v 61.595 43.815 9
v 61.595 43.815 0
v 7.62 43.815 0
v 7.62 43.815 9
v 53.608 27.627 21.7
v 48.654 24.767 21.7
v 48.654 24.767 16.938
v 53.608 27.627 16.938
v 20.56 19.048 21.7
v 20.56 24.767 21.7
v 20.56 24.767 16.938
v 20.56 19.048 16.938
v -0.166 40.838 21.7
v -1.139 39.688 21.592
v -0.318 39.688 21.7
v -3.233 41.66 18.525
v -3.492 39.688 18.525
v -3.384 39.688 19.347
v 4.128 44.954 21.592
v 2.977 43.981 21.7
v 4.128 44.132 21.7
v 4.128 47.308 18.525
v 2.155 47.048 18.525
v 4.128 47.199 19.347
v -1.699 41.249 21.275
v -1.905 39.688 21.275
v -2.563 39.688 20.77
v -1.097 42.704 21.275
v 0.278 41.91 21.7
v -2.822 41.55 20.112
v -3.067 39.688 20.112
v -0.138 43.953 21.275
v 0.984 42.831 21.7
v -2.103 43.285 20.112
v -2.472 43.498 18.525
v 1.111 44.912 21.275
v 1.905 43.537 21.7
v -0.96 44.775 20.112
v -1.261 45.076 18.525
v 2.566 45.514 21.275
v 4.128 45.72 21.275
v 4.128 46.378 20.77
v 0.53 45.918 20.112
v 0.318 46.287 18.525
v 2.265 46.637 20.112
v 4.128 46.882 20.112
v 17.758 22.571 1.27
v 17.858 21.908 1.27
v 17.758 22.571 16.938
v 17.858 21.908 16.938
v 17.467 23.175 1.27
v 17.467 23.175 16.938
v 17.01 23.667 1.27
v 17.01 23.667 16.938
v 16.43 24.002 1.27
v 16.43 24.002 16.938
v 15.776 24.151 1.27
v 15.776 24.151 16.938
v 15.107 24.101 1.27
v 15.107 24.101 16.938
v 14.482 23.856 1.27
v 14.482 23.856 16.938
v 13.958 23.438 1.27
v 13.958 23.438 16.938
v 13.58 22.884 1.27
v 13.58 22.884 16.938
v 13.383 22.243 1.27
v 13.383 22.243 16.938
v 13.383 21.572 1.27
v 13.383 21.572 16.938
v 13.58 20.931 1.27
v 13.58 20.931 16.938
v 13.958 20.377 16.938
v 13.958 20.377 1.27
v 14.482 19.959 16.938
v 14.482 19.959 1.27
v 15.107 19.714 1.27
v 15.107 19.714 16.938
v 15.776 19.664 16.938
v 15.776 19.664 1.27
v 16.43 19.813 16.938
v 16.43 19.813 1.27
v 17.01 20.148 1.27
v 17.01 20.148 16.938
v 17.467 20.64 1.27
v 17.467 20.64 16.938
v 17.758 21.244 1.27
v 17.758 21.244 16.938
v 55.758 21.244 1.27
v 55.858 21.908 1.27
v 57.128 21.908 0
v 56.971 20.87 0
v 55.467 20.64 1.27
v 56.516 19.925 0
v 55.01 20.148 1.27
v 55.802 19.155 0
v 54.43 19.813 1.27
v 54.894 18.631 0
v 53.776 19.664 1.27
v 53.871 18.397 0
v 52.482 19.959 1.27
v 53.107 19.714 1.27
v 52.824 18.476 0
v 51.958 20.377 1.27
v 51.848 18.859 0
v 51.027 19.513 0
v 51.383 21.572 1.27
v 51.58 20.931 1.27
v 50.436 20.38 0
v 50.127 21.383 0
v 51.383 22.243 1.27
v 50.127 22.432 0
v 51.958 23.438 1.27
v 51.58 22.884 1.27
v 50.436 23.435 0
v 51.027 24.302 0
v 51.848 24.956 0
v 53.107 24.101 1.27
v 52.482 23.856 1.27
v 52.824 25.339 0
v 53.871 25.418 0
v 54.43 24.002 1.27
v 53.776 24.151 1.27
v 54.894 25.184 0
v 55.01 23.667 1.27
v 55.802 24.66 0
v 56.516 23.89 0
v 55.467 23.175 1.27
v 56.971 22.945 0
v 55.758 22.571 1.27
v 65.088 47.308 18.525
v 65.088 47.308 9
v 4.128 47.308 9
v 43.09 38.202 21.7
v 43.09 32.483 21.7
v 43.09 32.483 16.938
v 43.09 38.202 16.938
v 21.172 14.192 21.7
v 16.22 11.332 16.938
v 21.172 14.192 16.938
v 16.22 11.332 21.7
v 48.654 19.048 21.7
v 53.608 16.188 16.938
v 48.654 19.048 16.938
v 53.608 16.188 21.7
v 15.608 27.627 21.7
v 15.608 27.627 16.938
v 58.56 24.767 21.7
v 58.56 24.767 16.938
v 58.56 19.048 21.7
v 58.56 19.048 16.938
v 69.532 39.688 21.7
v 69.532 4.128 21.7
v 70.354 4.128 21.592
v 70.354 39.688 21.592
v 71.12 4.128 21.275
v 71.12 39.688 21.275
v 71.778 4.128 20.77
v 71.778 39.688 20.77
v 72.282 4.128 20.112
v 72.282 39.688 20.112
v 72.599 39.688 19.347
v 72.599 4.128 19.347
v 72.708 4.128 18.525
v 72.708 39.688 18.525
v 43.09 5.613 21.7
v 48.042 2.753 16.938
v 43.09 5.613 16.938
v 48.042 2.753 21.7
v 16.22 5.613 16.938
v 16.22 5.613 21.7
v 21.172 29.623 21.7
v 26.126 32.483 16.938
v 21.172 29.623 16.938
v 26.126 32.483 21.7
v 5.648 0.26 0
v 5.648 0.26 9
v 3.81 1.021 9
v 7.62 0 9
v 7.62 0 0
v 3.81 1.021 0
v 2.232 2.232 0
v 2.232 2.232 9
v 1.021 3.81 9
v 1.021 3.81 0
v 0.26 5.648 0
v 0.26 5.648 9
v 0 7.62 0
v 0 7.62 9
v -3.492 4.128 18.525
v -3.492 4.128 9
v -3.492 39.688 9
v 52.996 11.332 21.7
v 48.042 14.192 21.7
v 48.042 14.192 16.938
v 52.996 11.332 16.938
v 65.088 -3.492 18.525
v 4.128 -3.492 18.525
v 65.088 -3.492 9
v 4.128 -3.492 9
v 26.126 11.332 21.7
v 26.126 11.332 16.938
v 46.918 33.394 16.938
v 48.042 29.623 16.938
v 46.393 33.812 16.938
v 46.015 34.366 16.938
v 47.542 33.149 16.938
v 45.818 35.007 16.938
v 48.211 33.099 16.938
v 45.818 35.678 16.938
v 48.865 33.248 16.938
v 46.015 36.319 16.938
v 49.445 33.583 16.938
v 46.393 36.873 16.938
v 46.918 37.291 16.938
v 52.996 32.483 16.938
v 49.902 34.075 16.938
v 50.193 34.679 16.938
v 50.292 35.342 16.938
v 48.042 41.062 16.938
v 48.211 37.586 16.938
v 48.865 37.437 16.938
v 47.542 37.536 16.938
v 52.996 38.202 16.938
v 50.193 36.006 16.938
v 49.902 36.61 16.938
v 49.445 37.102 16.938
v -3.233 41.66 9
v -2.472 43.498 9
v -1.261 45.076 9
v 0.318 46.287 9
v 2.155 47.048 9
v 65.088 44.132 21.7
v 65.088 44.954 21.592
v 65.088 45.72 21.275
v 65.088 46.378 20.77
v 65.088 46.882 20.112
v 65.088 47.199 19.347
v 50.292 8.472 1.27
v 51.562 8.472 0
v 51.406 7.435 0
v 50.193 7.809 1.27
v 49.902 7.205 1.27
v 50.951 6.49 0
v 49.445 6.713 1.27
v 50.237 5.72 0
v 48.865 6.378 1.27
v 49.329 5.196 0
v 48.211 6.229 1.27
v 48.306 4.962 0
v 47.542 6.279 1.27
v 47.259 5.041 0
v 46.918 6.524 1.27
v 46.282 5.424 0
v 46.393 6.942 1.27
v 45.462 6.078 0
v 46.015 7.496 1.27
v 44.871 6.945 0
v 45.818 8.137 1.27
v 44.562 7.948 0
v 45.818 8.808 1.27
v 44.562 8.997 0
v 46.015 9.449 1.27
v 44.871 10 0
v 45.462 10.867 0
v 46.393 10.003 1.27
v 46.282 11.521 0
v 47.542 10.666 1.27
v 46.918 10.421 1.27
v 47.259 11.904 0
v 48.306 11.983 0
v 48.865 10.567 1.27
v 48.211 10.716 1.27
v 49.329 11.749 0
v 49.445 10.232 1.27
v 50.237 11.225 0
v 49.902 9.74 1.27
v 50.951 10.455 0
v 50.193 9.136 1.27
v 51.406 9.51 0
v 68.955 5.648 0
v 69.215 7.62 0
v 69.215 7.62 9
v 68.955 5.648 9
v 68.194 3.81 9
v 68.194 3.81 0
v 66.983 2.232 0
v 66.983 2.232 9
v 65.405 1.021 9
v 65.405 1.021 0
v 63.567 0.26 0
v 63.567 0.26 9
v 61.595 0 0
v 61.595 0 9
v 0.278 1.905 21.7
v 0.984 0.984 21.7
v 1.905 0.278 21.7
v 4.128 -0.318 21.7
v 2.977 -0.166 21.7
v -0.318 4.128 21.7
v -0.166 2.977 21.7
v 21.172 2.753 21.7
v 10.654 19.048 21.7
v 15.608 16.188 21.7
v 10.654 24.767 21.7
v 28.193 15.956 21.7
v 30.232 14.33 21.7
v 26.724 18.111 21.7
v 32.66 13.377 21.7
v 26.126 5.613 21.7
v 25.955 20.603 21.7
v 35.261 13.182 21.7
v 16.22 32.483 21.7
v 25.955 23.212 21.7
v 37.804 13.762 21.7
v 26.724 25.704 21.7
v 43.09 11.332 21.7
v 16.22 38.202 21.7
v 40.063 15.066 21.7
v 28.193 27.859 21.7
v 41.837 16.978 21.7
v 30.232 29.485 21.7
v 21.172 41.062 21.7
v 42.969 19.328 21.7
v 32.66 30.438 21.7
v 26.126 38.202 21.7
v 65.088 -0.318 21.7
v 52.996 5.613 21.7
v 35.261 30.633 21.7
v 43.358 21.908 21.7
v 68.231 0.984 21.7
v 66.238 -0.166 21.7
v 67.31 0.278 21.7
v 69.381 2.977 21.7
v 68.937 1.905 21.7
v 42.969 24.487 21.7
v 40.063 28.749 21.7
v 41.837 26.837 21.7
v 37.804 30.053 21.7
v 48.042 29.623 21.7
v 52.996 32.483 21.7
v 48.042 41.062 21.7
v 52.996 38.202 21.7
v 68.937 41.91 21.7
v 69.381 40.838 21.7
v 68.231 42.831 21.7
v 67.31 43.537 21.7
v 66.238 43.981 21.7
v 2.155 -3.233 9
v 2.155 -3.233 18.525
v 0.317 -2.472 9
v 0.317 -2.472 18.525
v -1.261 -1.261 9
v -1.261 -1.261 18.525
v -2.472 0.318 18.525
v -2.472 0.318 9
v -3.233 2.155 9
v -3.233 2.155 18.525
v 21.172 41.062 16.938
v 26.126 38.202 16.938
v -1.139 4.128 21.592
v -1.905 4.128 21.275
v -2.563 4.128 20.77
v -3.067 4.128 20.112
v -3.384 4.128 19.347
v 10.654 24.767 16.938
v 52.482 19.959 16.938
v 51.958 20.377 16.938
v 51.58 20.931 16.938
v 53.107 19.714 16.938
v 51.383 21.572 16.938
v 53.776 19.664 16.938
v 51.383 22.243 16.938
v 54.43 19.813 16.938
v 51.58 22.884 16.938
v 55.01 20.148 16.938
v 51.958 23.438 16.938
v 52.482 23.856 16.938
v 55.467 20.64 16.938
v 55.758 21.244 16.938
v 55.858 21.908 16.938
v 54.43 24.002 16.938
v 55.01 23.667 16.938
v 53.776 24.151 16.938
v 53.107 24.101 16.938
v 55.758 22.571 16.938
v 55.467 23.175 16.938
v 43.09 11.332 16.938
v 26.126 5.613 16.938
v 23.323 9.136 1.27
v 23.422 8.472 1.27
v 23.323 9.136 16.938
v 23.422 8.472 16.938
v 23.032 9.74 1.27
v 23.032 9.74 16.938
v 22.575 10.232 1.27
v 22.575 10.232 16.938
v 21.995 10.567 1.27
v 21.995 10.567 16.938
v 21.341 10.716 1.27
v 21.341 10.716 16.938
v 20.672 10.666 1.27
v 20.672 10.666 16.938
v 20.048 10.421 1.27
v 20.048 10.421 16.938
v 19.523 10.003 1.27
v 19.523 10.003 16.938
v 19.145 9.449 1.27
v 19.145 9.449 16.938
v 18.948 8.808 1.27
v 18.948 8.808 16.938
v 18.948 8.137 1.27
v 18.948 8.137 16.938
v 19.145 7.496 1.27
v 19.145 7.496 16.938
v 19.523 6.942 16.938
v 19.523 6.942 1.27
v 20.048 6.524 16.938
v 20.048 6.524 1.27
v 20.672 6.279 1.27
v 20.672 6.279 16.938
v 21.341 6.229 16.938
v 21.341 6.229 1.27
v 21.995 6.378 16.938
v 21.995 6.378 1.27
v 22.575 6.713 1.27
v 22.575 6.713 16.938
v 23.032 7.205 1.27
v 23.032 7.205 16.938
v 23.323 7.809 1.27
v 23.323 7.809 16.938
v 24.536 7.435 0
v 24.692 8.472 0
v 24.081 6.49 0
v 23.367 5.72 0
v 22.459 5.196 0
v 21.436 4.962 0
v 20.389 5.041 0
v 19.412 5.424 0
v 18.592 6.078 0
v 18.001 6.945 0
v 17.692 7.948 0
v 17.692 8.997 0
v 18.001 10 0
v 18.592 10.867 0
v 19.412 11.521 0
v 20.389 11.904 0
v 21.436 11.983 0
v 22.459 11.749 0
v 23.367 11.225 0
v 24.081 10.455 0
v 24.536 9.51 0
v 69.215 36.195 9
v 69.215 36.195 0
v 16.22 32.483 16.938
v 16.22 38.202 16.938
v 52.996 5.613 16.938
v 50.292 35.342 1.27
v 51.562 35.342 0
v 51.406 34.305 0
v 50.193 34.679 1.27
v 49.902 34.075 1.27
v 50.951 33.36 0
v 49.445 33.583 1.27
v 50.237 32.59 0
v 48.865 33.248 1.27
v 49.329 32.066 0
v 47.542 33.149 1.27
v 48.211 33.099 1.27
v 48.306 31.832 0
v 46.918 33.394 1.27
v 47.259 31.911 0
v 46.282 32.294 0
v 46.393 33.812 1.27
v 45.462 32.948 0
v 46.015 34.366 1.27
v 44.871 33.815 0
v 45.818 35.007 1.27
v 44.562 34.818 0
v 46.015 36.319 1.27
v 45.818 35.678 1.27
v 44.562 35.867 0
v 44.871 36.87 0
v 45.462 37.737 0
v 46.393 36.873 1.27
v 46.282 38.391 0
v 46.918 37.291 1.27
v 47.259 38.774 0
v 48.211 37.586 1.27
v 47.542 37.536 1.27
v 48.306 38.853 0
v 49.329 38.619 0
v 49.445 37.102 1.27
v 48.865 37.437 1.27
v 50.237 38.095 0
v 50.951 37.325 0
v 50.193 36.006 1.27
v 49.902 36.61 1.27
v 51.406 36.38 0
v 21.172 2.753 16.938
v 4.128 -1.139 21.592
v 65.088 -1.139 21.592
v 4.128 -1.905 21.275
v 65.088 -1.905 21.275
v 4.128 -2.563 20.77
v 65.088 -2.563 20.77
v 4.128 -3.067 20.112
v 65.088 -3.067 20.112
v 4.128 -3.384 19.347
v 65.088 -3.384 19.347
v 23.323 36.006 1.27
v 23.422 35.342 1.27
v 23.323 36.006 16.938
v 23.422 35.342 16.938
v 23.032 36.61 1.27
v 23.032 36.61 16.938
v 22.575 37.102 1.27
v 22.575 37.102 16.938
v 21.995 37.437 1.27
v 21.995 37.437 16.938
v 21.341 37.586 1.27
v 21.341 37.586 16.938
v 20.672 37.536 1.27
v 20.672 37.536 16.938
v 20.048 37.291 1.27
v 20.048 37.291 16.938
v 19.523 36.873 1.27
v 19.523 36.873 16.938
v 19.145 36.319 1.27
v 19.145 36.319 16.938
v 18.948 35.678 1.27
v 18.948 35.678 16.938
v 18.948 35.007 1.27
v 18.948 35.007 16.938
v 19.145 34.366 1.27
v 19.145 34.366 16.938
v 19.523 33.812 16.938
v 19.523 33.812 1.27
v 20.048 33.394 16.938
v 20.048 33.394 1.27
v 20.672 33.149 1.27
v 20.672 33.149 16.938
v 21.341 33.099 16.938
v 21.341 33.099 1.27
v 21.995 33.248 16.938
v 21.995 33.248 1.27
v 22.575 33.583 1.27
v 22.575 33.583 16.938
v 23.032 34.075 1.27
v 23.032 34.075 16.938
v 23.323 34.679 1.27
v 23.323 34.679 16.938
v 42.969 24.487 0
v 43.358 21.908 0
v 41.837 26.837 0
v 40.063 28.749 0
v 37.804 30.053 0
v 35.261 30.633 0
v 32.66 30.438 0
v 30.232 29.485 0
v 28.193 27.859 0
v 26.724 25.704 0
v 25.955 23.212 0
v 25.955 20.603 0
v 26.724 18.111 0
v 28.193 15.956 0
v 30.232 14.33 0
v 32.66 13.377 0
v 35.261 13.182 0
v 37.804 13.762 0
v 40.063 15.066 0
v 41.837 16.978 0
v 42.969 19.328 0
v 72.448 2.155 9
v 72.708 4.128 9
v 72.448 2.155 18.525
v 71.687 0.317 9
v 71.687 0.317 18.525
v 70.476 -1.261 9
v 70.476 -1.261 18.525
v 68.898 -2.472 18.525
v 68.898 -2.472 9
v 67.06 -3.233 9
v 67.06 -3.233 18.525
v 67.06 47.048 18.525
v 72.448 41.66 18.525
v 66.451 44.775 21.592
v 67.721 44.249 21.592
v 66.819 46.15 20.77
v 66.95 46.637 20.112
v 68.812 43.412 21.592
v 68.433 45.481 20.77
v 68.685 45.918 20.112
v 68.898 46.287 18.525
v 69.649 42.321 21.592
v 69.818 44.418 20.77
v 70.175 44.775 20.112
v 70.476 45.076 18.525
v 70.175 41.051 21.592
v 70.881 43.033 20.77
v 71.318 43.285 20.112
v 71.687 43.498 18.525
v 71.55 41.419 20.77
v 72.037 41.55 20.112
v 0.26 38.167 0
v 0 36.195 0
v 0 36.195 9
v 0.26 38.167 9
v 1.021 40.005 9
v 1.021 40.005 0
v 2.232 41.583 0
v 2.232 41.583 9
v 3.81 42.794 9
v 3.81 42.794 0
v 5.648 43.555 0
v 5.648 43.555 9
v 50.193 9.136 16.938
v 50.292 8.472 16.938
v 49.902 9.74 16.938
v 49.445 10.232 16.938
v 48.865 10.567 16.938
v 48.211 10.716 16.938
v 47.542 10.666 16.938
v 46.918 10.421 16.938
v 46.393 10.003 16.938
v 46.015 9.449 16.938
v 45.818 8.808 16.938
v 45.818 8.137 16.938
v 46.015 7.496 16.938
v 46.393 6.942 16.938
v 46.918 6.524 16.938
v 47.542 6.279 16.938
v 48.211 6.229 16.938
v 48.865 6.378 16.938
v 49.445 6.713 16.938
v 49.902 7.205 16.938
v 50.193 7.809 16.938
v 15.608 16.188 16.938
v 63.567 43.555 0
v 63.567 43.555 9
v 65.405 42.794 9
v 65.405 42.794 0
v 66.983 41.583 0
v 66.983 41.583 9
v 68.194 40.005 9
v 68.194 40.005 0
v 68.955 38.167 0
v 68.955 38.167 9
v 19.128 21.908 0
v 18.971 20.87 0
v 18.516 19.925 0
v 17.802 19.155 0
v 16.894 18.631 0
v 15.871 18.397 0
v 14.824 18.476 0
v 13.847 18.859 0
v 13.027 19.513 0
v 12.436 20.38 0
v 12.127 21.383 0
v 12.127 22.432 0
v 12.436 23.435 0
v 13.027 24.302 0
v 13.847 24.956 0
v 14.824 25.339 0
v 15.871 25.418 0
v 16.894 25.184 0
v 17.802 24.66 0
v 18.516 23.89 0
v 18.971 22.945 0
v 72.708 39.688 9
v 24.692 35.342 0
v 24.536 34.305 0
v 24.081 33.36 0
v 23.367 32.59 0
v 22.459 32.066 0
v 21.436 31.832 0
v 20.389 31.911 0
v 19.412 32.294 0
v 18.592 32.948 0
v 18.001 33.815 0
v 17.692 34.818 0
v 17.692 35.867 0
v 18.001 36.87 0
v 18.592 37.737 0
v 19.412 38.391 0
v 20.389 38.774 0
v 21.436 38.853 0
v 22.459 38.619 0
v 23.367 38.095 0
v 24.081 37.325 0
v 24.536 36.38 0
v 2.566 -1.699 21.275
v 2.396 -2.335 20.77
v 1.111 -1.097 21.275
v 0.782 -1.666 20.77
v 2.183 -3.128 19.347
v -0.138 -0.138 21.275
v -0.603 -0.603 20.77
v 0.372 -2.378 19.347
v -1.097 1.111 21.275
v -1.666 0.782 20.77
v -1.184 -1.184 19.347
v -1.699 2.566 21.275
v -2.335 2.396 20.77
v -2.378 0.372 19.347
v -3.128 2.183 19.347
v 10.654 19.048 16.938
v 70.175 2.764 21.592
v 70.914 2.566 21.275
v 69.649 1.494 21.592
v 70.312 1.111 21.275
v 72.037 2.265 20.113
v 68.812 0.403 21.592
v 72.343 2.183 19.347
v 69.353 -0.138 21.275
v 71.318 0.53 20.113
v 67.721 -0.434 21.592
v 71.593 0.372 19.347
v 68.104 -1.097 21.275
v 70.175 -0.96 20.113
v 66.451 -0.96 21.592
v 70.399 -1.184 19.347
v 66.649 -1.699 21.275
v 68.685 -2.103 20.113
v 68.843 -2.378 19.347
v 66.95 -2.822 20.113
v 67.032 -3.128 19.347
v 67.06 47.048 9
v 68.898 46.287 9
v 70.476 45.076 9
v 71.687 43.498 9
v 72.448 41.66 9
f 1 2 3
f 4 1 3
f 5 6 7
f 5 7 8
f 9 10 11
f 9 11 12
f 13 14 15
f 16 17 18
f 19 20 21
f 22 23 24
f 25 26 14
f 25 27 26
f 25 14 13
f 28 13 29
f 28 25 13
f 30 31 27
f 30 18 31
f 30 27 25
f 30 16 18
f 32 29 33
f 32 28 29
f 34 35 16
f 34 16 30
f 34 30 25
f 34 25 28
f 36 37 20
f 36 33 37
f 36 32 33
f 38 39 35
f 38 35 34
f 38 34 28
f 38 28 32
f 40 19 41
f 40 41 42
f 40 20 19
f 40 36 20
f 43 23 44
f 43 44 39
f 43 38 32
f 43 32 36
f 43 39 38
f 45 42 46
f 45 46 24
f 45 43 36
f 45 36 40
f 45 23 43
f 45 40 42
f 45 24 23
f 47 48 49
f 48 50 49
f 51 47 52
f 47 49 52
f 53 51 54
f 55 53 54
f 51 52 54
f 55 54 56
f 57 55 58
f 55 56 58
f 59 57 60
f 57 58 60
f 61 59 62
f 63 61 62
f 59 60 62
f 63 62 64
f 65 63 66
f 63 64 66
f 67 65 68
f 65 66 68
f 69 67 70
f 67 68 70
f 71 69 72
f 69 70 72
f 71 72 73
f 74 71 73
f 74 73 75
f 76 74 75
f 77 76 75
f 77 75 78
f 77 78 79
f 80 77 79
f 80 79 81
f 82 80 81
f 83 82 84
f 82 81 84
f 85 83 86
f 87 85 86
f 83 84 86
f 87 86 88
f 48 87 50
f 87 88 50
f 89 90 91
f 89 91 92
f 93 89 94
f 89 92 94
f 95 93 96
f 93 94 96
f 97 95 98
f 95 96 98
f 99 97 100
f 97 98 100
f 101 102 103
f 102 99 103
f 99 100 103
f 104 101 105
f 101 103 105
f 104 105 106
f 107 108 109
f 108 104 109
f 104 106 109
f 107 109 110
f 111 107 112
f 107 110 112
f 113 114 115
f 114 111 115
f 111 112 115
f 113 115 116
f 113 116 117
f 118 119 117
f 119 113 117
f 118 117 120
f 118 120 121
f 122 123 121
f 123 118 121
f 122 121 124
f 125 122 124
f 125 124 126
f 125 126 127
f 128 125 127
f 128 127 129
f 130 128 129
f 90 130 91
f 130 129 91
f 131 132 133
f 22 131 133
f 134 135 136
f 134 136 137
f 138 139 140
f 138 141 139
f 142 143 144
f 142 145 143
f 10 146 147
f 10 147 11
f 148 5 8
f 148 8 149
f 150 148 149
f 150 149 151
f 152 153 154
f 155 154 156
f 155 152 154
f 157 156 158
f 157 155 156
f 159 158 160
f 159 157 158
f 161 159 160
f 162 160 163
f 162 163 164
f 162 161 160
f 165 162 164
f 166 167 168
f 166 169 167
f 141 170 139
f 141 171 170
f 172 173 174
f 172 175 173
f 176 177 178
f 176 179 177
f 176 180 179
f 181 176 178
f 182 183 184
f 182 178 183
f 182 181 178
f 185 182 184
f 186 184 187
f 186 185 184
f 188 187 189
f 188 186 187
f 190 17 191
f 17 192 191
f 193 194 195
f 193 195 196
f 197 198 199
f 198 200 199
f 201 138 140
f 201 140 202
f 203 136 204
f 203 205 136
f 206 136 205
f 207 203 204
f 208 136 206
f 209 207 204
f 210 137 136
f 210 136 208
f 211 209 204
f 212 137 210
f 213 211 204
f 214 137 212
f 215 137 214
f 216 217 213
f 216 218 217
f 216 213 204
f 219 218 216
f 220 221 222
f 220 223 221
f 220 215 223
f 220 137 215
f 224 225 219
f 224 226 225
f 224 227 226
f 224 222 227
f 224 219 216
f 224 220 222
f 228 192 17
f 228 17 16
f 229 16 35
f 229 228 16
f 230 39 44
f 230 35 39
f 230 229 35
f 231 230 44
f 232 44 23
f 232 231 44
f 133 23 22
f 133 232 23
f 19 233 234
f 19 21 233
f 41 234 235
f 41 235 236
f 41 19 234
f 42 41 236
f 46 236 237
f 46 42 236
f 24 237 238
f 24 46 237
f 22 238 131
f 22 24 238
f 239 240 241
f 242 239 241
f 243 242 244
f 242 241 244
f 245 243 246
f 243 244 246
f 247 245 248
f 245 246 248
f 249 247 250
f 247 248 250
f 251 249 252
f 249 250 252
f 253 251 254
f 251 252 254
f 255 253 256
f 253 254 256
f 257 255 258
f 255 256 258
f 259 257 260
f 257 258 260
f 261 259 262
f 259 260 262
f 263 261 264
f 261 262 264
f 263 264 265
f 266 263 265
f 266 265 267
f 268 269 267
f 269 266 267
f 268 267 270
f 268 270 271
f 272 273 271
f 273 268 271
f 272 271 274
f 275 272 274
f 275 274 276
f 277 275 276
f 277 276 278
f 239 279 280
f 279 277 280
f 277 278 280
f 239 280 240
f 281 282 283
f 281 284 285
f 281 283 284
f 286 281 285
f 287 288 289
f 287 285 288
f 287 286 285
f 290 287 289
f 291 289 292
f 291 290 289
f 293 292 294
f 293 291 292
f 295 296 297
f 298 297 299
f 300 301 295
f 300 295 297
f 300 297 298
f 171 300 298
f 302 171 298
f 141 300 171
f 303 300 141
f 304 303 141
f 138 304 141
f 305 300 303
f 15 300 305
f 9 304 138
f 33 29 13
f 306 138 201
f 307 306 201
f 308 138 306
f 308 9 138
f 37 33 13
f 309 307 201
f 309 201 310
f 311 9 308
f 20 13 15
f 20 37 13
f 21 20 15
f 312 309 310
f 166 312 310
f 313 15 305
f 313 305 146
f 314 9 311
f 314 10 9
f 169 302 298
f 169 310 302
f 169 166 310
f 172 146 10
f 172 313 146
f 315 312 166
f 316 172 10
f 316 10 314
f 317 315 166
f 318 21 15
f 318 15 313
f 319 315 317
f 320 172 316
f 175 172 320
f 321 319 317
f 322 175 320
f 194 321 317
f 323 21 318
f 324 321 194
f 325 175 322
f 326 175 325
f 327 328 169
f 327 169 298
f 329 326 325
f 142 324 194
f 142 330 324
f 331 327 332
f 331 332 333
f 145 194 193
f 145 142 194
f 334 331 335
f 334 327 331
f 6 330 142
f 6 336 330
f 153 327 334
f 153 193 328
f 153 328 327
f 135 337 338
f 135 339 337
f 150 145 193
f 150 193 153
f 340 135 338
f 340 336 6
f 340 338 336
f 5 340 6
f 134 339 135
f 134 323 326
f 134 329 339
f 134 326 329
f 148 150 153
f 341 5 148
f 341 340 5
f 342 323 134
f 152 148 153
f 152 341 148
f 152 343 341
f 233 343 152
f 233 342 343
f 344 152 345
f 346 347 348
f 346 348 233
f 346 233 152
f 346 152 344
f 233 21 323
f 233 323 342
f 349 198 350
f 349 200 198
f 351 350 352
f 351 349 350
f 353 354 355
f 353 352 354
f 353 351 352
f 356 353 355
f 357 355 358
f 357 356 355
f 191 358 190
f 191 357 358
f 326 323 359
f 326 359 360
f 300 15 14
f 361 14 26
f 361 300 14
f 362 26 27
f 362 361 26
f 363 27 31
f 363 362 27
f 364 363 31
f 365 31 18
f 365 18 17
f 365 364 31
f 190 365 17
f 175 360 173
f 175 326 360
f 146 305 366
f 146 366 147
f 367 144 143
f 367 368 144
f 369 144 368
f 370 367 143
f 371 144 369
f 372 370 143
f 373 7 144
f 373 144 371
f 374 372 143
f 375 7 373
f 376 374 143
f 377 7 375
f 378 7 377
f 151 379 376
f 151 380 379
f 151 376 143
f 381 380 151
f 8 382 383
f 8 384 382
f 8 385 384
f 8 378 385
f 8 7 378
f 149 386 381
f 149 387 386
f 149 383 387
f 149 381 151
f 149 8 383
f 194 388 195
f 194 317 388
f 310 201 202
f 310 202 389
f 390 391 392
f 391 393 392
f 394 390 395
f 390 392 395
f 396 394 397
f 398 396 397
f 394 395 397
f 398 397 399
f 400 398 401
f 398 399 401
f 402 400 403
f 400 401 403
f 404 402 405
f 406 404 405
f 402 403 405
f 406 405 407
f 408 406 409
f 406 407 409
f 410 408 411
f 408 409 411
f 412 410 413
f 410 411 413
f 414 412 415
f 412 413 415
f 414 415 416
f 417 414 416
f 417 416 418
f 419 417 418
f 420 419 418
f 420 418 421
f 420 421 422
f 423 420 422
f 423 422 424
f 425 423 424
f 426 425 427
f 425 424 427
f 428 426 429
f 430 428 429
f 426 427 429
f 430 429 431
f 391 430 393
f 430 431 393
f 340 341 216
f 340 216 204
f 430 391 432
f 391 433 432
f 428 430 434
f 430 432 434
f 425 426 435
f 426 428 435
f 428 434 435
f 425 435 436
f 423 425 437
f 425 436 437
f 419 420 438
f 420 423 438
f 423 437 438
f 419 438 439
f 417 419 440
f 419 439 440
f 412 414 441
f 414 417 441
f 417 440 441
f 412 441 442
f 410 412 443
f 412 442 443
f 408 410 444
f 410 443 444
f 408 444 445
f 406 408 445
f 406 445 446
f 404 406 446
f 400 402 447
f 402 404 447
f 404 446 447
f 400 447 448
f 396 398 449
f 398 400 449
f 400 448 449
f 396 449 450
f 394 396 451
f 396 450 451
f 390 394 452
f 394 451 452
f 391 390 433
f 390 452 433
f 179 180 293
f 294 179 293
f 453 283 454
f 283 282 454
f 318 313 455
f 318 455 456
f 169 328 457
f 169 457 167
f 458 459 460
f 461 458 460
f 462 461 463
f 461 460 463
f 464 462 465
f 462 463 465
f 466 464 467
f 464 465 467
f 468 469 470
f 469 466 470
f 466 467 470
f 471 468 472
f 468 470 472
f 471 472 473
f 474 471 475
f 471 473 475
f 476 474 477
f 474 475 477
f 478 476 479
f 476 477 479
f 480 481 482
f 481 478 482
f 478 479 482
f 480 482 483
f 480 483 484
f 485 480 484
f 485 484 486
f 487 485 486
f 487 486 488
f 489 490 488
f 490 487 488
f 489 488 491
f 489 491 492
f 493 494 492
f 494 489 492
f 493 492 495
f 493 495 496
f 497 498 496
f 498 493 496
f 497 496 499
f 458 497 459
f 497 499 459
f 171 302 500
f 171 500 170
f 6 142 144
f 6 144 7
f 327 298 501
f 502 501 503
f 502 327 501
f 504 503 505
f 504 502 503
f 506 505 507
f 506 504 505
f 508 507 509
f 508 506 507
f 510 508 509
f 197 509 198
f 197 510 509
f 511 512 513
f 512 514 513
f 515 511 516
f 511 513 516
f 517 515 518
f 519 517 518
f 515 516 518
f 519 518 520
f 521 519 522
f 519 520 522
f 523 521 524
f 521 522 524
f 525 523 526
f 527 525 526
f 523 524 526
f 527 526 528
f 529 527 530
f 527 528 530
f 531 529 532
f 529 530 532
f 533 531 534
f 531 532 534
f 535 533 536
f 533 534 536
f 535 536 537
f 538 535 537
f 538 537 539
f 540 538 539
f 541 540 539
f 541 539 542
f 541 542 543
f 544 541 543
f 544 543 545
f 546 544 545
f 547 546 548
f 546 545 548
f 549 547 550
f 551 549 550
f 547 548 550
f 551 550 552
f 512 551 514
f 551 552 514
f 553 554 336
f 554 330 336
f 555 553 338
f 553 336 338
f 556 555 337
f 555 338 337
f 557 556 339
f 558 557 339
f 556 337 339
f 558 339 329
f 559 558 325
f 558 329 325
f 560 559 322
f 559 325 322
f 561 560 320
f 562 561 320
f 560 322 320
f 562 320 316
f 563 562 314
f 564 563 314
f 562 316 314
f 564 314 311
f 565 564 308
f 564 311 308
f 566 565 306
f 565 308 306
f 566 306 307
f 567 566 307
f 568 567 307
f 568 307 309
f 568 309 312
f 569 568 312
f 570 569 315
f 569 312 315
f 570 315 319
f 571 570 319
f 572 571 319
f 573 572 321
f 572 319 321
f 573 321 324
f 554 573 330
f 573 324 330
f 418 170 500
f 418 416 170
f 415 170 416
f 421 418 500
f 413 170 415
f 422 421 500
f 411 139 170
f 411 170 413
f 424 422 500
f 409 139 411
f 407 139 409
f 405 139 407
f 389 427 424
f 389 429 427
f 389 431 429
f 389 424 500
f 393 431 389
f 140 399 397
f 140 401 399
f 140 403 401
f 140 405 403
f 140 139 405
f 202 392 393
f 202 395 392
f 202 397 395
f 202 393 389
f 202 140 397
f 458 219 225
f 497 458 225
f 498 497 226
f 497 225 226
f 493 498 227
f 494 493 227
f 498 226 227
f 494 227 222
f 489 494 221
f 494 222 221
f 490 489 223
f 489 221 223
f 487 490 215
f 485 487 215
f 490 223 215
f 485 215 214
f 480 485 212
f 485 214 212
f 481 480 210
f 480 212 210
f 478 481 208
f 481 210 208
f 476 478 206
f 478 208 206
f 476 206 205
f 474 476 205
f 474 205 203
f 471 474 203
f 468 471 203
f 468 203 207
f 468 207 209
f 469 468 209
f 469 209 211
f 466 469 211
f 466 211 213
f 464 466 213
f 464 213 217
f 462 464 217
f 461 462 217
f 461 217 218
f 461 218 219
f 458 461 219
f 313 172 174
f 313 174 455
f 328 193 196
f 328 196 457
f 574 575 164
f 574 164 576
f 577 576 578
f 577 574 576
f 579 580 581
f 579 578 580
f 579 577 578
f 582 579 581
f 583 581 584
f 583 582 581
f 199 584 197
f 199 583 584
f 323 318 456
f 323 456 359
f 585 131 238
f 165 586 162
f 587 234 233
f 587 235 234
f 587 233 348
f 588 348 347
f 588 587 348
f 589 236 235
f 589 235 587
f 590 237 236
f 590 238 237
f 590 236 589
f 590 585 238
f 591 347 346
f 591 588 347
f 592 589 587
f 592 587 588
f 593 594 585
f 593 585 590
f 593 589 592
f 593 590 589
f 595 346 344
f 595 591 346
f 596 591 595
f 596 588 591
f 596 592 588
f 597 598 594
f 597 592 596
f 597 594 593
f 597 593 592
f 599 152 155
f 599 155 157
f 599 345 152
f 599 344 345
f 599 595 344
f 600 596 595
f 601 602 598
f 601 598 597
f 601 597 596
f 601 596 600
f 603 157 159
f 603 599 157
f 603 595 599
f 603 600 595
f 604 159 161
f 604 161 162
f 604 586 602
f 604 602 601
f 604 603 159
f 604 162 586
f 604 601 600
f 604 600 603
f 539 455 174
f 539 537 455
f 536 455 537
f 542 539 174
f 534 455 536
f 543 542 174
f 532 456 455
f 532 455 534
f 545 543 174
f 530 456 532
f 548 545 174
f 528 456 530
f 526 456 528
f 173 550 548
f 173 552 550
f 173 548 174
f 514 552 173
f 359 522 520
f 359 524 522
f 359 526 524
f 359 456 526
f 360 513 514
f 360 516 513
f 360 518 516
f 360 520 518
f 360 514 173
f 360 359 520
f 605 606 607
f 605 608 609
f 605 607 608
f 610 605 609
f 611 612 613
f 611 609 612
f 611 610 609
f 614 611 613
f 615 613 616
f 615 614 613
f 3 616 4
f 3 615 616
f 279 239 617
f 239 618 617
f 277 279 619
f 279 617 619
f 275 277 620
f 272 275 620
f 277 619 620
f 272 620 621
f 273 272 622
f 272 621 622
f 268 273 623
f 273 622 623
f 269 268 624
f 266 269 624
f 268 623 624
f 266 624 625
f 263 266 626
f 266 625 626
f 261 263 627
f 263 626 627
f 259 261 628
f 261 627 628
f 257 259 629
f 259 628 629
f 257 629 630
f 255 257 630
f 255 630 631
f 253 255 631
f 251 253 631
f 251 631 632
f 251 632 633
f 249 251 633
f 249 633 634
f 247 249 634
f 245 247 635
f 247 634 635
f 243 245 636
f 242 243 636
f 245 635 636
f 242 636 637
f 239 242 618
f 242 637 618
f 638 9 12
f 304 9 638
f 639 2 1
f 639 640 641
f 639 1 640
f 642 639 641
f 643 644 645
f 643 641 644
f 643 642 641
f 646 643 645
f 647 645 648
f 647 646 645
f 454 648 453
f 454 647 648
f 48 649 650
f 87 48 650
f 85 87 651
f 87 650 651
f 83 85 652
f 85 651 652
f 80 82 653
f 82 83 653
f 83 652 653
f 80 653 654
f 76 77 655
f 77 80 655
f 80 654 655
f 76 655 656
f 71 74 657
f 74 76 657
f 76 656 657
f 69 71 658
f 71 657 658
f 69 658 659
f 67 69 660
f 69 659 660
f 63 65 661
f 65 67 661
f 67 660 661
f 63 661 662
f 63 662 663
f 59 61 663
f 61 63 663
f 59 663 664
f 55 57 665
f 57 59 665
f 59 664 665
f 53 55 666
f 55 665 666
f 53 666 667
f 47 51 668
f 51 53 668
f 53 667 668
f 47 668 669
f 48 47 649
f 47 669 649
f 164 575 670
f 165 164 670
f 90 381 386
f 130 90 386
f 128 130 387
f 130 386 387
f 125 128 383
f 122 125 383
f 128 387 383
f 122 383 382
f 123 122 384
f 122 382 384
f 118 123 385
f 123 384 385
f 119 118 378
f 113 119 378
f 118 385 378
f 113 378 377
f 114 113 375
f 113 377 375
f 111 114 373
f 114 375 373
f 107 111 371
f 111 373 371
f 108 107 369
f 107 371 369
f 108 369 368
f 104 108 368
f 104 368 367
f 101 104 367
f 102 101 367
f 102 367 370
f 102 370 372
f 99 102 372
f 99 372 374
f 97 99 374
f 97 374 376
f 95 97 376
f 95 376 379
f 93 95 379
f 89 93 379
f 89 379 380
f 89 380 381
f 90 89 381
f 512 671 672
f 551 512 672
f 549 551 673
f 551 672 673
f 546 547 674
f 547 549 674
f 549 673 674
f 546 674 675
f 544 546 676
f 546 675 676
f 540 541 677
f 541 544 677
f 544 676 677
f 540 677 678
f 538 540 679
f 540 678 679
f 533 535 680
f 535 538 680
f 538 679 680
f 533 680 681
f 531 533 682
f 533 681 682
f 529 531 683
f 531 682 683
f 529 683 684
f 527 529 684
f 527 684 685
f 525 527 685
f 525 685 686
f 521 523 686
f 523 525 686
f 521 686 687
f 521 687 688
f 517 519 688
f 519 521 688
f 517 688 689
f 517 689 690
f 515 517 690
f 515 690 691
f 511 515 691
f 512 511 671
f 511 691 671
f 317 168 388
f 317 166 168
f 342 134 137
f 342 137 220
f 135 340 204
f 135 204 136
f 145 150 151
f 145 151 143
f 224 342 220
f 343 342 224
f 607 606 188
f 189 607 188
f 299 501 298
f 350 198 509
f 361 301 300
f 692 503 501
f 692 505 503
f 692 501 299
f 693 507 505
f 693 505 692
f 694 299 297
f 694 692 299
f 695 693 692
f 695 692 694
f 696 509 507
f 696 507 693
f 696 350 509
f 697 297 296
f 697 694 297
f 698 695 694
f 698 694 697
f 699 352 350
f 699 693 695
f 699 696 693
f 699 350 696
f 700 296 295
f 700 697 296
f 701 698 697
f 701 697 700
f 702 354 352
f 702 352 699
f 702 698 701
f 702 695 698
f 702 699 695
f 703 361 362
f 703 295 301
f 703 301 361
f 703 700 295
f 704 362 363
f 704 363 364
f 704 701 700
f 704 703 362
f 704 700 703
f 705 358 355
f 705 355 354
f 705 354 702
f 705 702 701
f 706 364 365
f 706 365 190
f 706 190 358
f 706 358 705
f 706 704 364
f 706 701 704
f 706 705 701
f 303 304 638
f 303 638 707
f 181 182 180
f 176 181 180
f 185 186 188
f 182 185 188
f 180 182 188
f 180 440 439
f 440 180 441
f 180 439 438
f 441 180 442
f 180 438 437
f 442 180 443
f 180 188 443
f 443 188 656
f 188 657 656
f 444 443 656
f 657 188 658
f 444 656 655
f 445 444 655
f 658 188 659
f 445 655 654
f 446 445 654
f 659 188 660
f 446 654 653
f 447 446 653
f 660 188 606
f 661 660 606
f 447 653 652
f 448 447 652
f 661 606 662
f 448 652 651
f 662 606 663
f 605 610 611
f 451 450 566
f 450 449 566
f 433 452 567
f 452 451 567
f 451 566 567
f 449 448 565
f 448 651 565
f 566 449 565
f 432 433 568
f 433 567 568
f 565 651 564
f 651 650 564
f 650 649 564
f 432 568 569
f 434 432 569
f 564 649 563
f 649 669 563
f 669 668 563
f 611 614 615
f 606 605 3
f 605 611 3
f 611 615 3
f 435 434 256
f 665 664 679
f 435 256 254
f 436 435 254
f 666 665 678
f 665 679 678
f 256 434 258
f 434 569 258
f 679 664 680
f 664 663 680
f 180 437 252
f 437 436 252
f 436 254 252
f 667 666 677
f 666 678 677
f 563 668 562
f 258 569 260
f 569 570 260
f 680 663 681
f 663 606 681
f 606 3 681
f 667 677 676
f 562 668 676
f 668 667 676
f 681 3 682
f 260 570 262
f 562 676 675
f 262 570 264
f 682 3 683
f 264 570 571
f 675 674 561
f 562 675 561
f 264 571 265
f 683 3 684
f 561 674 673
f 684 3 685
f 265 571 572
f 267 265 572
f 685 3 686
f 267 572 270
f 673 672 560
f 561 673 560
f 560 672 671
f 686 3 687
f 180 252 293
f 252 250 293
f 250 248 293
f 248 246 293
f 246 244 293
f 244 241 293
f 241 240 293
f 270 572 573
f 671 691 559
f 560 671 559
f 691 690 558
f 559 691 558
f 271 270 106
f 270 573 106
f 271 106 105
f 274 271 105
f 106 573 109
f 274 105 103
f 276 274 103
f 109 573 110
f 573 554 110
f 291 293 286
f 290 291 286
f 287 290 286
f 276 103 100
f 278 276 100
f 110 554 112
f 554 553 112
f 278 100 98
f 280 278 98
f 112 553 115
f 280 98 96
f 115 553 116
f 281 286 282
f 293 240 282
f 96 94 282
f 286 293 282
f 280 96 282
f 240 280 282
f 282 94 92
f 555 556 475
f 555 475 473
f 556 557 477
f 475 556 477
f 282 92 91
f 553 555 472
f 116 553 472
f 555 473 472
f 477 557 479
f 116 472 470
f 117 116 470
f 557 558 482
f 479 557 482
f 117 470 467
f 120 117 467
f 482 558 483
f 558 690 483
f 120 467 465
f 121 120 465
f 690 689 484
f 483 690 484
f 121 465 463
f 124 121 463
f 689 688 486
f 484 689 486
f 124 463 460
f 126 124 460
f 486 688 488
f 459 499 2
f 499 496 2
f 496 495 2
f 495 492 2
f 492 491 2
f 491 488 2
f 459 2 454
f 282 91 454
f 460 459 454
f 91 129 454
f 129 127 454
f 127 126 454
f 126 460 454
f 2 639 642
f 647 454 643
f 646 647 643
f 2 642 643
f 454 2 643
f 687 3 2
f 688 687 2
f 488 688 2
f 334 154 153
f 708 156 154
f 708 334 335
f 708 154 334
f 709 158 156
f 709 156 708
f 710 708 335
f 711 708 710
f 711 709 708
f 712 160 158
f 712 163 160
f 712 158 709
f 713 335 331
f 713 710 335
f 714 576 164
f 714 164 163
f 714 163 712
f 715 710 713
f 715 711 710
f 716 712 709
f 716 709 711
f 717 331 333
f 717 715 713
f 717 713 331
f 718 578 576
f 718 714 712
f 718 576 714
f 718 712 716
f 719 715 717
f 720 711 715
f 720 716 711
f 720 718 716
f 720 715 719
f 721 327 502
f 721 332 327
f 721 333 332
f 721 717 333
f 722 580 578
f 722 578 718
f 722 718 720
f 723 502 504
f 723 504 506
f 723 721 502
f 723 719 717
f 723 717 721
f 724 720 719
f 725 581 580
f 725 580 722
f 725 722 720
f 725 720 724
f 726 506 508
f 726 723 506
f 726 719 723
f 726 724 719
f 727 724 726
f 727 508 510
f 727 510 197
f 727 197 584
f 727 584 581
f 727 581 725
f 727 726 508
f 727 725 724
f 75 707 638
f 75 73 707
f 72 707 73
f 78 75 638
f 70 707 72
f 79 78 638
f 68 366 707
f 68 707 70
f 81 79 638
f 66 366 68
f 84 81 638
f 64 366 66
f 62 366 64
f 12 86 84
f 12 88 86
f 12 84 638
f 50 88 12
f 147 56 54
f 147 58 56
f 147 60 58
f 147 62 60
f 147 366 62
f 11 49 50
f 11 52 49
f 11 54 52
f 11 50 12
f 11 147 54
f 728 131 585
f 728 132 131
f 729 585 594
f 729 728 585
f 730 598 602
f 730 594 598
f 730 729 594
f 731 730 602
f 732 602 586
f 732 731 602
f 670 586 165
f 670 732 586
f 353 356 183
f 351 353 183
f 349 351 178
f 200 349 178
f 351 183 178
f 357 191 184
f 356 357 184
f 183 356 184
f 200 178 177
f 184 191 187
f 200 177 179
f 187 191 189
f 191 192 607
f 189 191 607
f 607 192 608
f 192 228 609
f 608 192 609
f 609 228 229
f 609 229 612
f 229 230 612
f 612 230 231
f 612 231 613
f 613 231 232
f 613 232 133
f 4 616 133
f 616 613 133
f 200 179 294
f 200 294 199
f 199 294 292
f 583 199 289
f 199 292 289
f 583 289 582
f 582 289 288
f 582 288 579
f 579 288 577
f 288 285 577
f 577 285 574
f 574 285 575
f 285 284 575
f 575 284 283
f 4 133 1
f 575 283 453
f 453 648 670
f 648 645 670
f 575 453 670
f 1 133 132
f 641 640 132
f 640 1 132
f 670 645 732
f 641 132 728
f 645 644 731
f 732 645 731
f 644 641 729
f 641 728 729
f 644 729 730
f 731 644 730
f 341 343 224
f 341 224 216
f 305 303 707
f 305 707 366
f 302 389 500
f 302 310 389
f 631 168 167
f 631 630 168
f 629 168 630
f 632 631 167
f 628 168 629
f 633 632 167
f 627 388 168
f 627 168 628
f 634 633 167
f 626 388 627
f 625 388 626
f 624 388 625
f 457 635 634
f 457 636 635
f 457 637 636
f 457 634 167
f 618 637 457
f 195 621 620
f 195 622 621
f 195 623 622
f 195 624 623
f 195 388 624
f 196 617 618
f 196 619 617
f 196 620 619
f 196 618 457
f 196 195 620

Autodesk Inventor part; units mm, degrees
ref_plane "YZ Plane" through (0, 0, 0) normal (1, 0, 0) x (0, 1, 0)
ref_plane "XZ Plane" through (0, 0, 0) normal (0, 1, 0) x (-1, 0, 0)
sketch "Sketch1" plane through (0, 0, 0) normal (0, 0, 1) x (1, 0, 0)
  line L0 (7.62, 0) -> (61.595, 0)
  line L1 (69.215, 7.62) -> (69.215, 36.195)
  line L2 (61.595, 43.815) -> (7.62, 43.815)
  line L3 (0, 36.195) -> (0, 7.62)
  arc A0 (7.62, 43.815) -> (0, 36.195) centre (7.62, 36.195) ccw
  arc A1 (0, 7.62) -> (7.62, 0) centre (7.62, 7.62) ccw
  arc A2 (61.595, 0) -> (69.215, 7.62) centre (61.595, 7.62) ccw
  arc A3 (69.215, 36.195) -> (61.595, 43.815) centre (61.595, 36.195) ccw
  point P0 (0, 0)
  point P1 (69.215, 43.815)
  point P2 (69.215, 0)
  point P3 (0, 43.815)
  dimension "d0" = 69.215
  dimension "d1" = 43.815
  dimension "d2" = 7.62
extrude "Extrusion1" add sketch "Sketch1" along normal blind 9
sketch "Sketch2" plane through (0, 0, 9) normal (0, 0, 1) x (1, 0, 0)
  line L0 (4.1275, -3.4925) -> (65.0875, -3.4925)
  line L1 (72.7075, 4.1275) -> (72.7075, 39.6875)
  line L2 (65.0875, 47.3075) -> (4.1275, 47.3075)
  line L3 (-3.4925, 39.6875) -> (-3.4925, 4.1275)
  arc A0 (4.1275, 47.3075) -> (-3.4925, 39.6875) centre (4.1275, 39.6875) ccw
  arc A1 (-3.4925, 4.1275) -> (4.1275, -3.4925) centre (4.1275, 4.1275) ccw
  arc A2 (65.0875, -3.4925) -> (72.7075, 4.1275) centre (65.0875, 4.1275) ccw
  arc A3 (72.7075, 39.6875) -> (65.0875, 47.3075) centre (65.0875, 39.6875) ccw
  line L4 (61.595, 43.815) -> (7.62, 43.815) construction
  line L5 (0, 36.195) -> (0, 7.62) construction
  point P0 (0, 0)
  point P1 (72.7075, 47.3075)
  point P2 (72.7075, -3.4925)
  point P3 (-3.4925, 47.3075)
  point P4 (34.6075, 47.3075)
  point P5 (34.6075, 43.815)
  point P6 (-3.4925, 21.9075)
  point P7 (0, 21.9075)
  dimension "d5" = 76.2
  dimension "d6" = 50.8
  dimension "d7" = 7.62
extrude "Extrusion2" add sketch "Sketch2" along normal blind 12.7
fillet "Fillet1" radius 3.175 8 edges at (-1.2607, 45.0757, 21.7) (-3.4925, 21.9075, 21.7) (-1.2607, -1.2607, 21.7) (34.6075, -3.4925, 21.7) (70.4757, -1.2607, 21.7) (72.7075, 21.9075, 21.7) (70.4757, 45.0757, 21.7) (34.6075, 47.3075, 21.7)
sketch "Sketch3" plane through (0, 0, 21.7) normal (0, 0, 1) x (1, 0, 0)
  line L0 (65.0875, 47.3075) -> (4.1275, 47.3075) construction
  line L1 (65.0875, 47.3075) -> (4.1275, 47.3075) construction
  line L2 (-3.4925, 39.6875) -> (-3.4925, 4.1275) construction
  line L3 (-3.4925, 39.6875) -> (-3.4925, 4.1275) construction
  circle A0 centre (34.6075, 21.9075) radius 8.75
  circle A1 centre (34.6075, 21.9075) radius 19 construction
  circle A2 centre (21.1725, 35.3425) radius 2.25
  circle A3 centre (48.0425, 35.3425) radius 2.25
  circle A4 centre (15.6075, 21.9075) radius 2.25
  circle A5 centre (53.6075, 21.9075) radius 2.25
  circle A6 centre (21.1725, 8.4725) radius 2.25
  circle A7 centre (48.0425, 8.4725) radius 2.25
  line L4 (21.1725, 35.3425) -> (34.6075, 21.9075) construction
  line L5 (34.6075, 21.9075) -> (15.6075, 21.9075) construction
  point P0 (0, 0)
  point P1 (34.6075, 47.3075)
  point P2 (-3.4925, 21.9075)
  point P3 (-3.4925, 21.9075)
  dimension "d11" = 17.5
  dimension "d14" = 4.5
  dimension "d15" = 38
  dimension "d16" = 45
extrude "Extrusion3" cut sketch "Sketch3" against normal up to surface (21.7 mm away)
chamfer "Chamfer1" distance 1.27 angle 45 6 edges at (45.7925, 35.3425, 0) (18.9225, 35.3425, 0) (13.3575, 21.9075, 0) (51.3575, 21.9075, 0) (45.7925, 8.4725, 0) (18.9225, 8.4725, 0)
sketch "Sketch4" plane through (7.62, 0, 0) normal (0, -1, 0) x (1, 0, 0)
  point P0 (-7.62, 0)
ref_plane "Work Plane1" through (-0.635, 46.99, -50.8) normal (0, 1, 0) x (0, 0, 1)
sketch "Sketch7" plane through (0, 0, 21.7) normal (0, 0, 1) x (1, 0, 0)
  line L0 (21.1725, 2.7532) -> (16.2195, 5.6129)
  line L1 (16.2195, 5.6129) -> (16.2195, 11.3321)
  line L2 (16.2195, 11.3321) -> (21.1725, 14.1917)
  line L3 (21.1725, 14.1917) -> (26.1255, 11.3321)
  line L4 (26.1255, 11.3321) -> (26.1255, 5.6129)
  line L5 (26.1255, 5.6129) -> (21.1725, 2.7532)
  circle A0 centre (48.0425, 35.3425) radius 2.25 construction
  circle A1 centre (53.6075, 21.9075) radius 2.25 construction
  circle A2 centre (48.0425, 8.4725) radius 2.25 construction
  circle A3 centre (21.1725, 8.4725) radius 2.25 construction
  circle A4 centre (15.6075, 21.9075) radius 2.25 construction
  circle A5 centre (21.1725, 35.3425) radius 2.25 construction
  line L6 (53.6075, 16.1883) -> (48.6545, 19.0479)
  line L7 (48.6545, 19.0479) -> (48.6545, 24.7671)
  line L8 (48.6545, 24.7671) -> (53.6075, 27.6267)
  line L9 (53.6075, 27.6267) -> (58.5605, 24.7671)
  line L10 (58.5605, 24.7671) -> (58.5605, 19.0479)
  line L11 (58.5605, 19.0479) -> (53.6075, 16.1883)
  line L12 (48.0425, 29.6233) -> (43.0895, 32.4829)
  line L13 (43.0895, 32.4829) -> (43.0895, 38.2021)
  line L14 (43.0895, 38.2021) -> (48.0425, 41.0618)
  line L15 (48.0425, 41.0618) -> (52.9955, 38.2021)
  line L16 (52.9955, 38.2021) -> (52.9955, 32.4829)
  line L17 (52.9955, 32.4829) -> (48.0425, 29.6233)
  line L18 (15.6075, 16.1883) -> (10.6545, 19.0479)
  line L19 (10.6545, 19.0479) -> (10.6545, 24.7671)
  line L20 (10.6545, 24.7671) -> (15.6075, 27.6267)
  line L21 (15.6075, 27.6267) -> (20.5605, 24.7671)
  line L22 (20.5605, 24.7671) -> (20.5605, 19.0479)
  line L23 (20.5605, 19.0479) -> (15.6075, 16.1883)
  line L24 (21.1725, 29.6233) -> (16.2195, 32.4829)
  line L25 (16.2195, 32.4829) -> (16.2195, 38.2021)
  line L26 (16.2195, 38.2021) -> (21.1725, 41.0618)
  line L27 (21.1725, 41.0618) -> (26.1255, 38.2021)
  line L28 (26.1255, 38.2021) -> (26.1255, 32.4829)
  line L29 (26.1255, 32.4829) -> (21.1725, 29.6233)
  line L30 (48.0425, 2.7532) -> (43.0895, 5.6129)
  line L31 (43.0895, 5.6129) -> (43.0895, 11.3321)
  line L32 (43.0895, 11.3321) -> (48.0425, 14.1917)
  line L33 (48.0425, 14.1917) -> (52.9955, 11.3321)
  line L34 (52.9955, 11.3321) -> (52.9955, 5.6129)
  line L35 (52.9955, 5.6129) -> (48.0425, 2.7532)
  point P0 (0, 0)
  dimension "d26" = 9.906
extrude "Extrusion6" cut sketch "Sketch7" against normal blind 4.7625
properties part number "2x3_Spacer_Rear"
